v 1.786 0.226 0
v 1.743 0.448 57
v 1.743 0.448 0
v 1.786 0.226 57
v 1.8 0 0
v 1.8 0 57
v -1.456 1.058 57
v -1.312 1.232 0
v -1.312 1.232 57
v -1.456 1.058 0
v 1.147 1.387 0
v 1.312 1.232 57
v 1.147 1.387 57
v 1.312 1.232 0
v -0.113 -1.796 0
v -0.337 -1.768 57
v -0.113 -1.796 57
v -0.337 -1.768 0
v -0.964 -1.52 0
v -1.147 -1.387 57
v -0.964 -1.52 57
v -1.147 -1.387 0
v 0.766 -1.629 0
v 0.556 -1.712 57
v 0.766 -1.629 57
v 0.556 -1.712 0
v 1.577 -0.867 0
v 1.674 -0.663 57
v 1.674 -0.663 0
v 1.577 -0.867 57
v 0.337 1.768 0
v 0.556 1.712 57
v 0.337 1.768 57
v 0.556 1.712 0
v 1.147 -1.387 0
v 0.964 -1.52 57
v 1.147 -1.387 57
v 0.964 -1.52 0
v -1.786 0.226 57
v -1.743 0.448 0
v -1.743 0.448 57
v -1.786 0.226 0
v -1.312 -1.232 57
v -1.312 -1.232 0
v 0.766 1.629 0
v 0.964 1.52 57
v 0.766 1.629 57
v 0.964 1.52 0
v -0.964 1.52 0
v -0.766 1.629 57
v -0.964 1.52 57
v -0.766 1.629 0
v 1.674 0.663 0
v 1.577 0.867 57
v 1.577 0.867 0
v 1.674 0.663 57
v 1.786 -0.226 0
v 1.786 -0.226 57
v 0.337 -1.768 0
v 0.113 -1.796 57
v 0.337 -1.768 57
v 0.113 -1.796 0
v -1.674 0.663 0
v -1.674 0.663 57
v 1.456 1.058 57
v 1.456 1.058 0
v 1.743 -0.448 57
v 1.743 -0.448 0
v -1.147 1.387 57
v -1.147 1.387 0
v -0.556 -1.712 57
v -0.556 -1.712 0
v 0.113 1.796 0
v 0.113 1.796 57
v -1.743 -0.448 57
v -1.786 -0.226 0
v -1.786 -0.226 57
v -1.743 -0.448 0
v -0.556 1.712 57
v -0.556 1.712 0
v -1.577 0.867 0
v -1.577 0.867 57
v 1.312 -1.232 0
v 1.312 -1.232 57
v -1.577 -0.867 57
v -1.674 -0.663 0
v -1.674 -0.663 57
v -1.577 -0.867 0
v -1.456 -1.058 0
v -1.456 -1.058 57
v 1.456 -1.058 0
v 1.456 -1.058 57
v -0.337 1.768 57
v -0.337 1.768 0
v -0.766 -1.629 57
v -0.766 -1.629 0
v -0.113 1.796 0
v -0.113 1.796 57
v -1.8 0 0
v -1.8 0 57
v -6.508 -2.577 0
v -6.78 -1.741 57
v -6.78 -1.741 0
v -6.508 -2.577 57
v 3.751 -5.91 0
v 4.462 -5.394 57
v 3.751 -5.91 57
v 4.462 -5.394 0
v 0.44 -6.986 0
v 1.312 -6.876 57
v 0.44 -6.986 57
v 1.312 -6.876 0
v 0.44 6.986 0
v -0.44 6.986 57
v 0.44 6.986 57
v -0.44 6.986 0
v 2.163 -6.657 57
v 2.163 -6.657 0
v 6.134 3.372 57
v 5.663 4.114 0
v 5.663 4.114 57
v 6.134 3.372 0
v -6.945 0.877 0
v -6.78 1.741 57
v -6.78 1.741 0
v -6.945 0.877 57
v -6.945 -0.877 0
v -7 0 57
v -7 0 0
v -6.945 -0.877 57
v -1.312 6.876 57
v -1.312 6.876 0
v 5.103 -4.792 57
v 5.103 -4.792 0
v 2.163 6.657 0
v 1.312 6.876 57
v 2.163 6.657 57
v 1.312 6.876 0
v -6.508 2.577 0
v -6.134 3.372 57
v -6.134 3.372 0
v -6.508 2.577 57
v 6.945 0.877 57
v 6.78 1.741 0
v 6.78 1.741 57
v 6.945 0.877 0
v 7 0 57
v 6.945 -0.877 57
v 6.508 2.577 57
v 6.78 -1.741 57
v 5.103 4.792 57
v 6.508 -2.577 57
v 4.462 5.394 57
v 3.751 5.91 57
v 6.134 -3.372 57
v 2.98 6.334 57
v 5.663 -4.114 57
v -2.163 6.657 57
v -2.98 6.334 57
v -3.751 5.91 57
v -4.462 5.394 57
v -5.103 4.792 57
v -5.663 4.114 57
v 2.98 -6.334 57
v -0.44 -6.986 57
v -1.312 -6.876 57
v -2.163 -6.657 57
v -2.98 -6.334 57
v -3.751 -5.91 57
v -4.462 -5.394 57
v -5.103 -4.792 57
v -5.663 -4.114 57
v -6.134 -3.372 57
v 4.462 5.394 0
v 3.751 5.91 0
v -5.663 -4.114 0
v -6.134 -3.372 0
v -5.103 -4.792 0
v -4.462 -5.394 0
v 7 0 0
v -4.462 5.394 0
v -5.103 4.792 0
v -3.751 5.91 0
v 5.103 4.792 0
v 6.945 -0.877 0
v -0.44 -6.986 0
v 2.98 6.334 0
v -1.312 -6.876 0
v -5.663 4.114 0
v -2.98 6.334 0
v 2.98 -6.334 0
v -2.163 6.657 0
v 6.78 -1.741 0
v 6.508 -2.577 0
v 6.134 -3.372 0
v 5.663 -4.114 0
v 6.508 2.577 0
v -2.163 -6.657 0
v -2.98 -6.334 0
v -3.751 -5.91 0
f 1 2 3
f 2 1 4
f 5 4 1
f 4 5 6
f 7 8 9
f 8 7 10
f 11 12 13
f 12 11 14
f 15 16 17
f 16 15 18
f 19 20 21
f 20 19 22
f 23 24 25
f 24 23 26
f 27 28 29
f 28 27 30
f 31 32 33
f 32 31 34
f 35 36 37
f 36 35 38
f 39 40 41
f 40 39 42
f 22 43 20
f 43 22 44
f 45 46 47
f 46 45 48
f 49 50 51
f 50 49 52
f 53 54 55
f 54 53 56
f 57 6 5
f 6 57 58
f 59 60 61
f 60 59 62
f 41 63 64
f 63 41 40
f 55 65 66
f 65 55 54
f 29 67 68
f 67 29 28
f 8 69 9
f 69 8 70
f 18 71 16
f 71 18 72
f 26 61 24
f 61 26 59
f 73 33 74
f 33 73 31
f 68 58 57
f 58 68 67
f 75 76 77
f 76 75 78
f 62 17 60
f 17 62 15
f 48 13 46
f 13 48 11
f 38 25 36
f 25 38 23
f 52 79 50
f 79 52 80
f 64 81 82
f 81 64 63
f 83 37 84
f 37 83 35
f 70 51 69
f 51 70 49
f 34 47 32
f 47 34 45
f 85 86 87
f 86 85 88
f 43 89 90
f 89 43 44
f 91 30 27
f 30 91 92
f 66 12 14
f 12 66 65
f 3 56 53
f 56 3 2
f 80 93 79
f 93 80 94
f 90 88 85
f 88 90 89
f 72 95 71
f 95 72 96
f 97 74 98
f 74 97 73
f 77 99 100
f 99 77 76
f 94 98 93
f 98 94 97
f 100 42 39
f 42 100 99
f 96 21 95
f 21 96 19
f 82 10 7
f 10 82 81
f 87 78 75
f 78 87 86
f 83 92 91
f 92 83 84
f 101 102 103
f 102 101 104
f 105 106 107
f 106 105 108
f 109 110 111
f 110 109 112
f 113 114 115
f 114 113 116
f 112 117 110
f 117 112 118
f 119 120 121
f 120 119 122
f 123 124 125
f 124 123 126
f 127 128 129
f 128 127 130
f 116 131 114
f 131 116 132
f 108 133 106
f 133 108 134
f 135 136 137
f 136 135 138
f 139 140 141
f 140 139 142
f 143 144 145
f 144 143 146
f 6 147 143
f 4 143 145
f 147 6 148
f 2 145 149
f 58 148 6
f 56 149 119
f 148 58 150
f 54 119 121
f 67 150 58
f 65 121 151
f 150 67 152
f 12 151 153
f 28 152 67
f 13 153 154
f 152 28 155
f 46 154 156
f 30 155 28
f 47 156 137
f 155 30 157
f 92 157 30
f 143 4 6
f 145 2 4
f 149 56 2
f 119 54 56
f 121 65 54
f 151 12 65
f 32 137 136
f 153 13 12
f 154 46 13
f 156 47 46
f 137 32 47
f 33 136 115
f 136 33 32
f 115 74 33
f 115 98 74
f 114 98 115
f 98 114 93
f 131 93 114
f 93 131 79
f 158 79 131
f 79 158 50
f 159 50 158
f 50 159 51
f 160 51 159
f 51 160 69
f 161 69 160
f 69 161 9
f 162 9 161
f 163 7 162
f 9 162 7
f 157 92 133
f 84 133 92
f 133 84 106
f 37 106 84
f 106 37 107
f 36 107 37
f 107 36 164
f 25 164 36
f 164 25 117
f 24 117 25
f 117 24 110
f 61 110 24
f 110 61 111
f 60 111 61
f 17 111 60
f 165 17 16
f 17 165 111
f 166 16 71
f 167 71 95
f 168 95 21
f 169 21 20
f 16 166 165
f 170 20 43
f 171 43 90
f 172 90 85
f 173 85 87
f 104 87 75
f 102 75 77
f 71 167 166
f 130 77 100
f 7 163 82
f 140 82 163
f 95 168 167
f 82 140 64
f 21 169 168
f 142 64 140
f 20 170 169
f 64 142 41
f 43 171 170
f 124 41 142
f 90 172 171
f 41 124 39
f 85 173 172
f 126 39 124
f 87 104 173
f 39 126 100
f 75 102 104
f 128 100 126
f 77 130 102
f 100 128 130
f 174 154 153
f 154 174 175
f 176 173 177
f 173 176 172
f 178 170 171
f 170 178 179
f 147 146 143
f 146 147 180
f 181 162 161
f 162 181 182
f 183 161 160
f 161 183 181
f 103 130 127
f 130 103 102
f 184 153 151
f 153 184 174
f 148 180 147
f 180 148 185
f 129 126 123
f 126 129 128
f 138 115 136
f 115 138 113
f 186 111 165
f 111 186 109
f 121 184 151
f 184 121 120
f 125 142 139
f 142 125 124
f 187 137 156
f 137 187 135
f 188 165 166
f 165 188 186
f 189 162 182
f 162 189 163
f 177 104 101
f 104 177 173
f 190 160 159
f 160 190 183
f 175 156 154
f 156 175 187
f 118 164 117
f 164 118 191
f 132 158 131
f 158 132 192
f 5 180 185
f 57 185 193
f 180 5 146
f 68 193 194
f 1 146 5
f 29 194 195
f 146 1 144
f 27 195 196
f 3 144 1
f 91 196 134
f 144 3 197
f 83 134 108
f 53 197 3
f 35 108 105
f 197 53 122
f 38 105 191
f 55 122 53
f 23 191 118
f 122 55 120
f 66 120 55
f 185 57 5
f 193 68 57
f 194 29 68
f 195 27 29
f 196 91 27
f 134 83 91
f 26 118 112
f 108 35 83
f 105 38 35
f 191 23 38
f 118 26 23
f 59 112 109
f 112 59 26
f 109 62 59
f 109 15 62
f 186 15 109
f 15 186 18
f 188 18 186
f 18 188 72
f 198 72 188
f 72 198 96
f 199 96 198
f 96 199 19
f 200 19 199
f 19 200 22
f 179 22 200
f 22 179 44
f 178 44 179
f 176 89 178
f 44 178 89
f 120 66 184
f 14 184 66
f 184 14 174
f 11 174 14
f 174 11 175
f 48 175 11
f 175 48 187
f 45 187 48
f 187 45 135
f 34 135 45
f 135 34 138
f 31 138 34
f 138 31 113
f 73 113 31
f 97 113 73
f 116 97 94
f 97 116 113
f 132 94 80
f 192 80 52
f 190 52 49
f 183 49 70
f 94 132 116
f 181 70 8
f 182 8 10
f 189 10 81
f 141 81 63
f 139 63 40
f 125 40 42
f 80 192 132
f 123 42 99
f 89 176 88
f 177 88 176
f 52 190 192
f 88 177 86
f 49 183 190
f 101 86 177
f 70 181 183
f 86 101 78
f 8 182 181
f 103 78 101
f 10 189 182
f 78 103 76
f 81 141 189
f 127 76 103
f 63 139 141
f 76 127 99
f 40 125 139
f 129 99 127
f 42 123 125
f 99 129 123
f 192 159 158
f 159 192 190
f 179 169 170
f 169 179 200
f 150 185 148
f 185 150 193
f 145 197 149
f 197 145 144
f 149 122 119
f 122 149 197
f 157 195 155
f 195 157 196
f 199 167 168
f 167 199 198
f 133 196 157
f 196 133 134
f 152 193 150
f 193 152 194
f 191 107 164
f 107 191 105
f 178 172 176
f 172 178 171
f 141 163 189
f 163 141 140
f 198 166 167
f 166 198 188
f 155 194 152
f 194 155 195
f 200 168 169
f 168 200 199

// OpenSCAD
$fn = 50;


difference() {
	union() {
		cylinder(h = 57, r = 7.0000000000);
	}
	union() {
		translate(v = [0, 0, -100]) {
			cylinder(h = 200, r = 1.8000000000);
		}
		translate(v = [0, 0, -100]) {
			cylinder(h = 200, r = 1.8000000000);
		}
	}
}
